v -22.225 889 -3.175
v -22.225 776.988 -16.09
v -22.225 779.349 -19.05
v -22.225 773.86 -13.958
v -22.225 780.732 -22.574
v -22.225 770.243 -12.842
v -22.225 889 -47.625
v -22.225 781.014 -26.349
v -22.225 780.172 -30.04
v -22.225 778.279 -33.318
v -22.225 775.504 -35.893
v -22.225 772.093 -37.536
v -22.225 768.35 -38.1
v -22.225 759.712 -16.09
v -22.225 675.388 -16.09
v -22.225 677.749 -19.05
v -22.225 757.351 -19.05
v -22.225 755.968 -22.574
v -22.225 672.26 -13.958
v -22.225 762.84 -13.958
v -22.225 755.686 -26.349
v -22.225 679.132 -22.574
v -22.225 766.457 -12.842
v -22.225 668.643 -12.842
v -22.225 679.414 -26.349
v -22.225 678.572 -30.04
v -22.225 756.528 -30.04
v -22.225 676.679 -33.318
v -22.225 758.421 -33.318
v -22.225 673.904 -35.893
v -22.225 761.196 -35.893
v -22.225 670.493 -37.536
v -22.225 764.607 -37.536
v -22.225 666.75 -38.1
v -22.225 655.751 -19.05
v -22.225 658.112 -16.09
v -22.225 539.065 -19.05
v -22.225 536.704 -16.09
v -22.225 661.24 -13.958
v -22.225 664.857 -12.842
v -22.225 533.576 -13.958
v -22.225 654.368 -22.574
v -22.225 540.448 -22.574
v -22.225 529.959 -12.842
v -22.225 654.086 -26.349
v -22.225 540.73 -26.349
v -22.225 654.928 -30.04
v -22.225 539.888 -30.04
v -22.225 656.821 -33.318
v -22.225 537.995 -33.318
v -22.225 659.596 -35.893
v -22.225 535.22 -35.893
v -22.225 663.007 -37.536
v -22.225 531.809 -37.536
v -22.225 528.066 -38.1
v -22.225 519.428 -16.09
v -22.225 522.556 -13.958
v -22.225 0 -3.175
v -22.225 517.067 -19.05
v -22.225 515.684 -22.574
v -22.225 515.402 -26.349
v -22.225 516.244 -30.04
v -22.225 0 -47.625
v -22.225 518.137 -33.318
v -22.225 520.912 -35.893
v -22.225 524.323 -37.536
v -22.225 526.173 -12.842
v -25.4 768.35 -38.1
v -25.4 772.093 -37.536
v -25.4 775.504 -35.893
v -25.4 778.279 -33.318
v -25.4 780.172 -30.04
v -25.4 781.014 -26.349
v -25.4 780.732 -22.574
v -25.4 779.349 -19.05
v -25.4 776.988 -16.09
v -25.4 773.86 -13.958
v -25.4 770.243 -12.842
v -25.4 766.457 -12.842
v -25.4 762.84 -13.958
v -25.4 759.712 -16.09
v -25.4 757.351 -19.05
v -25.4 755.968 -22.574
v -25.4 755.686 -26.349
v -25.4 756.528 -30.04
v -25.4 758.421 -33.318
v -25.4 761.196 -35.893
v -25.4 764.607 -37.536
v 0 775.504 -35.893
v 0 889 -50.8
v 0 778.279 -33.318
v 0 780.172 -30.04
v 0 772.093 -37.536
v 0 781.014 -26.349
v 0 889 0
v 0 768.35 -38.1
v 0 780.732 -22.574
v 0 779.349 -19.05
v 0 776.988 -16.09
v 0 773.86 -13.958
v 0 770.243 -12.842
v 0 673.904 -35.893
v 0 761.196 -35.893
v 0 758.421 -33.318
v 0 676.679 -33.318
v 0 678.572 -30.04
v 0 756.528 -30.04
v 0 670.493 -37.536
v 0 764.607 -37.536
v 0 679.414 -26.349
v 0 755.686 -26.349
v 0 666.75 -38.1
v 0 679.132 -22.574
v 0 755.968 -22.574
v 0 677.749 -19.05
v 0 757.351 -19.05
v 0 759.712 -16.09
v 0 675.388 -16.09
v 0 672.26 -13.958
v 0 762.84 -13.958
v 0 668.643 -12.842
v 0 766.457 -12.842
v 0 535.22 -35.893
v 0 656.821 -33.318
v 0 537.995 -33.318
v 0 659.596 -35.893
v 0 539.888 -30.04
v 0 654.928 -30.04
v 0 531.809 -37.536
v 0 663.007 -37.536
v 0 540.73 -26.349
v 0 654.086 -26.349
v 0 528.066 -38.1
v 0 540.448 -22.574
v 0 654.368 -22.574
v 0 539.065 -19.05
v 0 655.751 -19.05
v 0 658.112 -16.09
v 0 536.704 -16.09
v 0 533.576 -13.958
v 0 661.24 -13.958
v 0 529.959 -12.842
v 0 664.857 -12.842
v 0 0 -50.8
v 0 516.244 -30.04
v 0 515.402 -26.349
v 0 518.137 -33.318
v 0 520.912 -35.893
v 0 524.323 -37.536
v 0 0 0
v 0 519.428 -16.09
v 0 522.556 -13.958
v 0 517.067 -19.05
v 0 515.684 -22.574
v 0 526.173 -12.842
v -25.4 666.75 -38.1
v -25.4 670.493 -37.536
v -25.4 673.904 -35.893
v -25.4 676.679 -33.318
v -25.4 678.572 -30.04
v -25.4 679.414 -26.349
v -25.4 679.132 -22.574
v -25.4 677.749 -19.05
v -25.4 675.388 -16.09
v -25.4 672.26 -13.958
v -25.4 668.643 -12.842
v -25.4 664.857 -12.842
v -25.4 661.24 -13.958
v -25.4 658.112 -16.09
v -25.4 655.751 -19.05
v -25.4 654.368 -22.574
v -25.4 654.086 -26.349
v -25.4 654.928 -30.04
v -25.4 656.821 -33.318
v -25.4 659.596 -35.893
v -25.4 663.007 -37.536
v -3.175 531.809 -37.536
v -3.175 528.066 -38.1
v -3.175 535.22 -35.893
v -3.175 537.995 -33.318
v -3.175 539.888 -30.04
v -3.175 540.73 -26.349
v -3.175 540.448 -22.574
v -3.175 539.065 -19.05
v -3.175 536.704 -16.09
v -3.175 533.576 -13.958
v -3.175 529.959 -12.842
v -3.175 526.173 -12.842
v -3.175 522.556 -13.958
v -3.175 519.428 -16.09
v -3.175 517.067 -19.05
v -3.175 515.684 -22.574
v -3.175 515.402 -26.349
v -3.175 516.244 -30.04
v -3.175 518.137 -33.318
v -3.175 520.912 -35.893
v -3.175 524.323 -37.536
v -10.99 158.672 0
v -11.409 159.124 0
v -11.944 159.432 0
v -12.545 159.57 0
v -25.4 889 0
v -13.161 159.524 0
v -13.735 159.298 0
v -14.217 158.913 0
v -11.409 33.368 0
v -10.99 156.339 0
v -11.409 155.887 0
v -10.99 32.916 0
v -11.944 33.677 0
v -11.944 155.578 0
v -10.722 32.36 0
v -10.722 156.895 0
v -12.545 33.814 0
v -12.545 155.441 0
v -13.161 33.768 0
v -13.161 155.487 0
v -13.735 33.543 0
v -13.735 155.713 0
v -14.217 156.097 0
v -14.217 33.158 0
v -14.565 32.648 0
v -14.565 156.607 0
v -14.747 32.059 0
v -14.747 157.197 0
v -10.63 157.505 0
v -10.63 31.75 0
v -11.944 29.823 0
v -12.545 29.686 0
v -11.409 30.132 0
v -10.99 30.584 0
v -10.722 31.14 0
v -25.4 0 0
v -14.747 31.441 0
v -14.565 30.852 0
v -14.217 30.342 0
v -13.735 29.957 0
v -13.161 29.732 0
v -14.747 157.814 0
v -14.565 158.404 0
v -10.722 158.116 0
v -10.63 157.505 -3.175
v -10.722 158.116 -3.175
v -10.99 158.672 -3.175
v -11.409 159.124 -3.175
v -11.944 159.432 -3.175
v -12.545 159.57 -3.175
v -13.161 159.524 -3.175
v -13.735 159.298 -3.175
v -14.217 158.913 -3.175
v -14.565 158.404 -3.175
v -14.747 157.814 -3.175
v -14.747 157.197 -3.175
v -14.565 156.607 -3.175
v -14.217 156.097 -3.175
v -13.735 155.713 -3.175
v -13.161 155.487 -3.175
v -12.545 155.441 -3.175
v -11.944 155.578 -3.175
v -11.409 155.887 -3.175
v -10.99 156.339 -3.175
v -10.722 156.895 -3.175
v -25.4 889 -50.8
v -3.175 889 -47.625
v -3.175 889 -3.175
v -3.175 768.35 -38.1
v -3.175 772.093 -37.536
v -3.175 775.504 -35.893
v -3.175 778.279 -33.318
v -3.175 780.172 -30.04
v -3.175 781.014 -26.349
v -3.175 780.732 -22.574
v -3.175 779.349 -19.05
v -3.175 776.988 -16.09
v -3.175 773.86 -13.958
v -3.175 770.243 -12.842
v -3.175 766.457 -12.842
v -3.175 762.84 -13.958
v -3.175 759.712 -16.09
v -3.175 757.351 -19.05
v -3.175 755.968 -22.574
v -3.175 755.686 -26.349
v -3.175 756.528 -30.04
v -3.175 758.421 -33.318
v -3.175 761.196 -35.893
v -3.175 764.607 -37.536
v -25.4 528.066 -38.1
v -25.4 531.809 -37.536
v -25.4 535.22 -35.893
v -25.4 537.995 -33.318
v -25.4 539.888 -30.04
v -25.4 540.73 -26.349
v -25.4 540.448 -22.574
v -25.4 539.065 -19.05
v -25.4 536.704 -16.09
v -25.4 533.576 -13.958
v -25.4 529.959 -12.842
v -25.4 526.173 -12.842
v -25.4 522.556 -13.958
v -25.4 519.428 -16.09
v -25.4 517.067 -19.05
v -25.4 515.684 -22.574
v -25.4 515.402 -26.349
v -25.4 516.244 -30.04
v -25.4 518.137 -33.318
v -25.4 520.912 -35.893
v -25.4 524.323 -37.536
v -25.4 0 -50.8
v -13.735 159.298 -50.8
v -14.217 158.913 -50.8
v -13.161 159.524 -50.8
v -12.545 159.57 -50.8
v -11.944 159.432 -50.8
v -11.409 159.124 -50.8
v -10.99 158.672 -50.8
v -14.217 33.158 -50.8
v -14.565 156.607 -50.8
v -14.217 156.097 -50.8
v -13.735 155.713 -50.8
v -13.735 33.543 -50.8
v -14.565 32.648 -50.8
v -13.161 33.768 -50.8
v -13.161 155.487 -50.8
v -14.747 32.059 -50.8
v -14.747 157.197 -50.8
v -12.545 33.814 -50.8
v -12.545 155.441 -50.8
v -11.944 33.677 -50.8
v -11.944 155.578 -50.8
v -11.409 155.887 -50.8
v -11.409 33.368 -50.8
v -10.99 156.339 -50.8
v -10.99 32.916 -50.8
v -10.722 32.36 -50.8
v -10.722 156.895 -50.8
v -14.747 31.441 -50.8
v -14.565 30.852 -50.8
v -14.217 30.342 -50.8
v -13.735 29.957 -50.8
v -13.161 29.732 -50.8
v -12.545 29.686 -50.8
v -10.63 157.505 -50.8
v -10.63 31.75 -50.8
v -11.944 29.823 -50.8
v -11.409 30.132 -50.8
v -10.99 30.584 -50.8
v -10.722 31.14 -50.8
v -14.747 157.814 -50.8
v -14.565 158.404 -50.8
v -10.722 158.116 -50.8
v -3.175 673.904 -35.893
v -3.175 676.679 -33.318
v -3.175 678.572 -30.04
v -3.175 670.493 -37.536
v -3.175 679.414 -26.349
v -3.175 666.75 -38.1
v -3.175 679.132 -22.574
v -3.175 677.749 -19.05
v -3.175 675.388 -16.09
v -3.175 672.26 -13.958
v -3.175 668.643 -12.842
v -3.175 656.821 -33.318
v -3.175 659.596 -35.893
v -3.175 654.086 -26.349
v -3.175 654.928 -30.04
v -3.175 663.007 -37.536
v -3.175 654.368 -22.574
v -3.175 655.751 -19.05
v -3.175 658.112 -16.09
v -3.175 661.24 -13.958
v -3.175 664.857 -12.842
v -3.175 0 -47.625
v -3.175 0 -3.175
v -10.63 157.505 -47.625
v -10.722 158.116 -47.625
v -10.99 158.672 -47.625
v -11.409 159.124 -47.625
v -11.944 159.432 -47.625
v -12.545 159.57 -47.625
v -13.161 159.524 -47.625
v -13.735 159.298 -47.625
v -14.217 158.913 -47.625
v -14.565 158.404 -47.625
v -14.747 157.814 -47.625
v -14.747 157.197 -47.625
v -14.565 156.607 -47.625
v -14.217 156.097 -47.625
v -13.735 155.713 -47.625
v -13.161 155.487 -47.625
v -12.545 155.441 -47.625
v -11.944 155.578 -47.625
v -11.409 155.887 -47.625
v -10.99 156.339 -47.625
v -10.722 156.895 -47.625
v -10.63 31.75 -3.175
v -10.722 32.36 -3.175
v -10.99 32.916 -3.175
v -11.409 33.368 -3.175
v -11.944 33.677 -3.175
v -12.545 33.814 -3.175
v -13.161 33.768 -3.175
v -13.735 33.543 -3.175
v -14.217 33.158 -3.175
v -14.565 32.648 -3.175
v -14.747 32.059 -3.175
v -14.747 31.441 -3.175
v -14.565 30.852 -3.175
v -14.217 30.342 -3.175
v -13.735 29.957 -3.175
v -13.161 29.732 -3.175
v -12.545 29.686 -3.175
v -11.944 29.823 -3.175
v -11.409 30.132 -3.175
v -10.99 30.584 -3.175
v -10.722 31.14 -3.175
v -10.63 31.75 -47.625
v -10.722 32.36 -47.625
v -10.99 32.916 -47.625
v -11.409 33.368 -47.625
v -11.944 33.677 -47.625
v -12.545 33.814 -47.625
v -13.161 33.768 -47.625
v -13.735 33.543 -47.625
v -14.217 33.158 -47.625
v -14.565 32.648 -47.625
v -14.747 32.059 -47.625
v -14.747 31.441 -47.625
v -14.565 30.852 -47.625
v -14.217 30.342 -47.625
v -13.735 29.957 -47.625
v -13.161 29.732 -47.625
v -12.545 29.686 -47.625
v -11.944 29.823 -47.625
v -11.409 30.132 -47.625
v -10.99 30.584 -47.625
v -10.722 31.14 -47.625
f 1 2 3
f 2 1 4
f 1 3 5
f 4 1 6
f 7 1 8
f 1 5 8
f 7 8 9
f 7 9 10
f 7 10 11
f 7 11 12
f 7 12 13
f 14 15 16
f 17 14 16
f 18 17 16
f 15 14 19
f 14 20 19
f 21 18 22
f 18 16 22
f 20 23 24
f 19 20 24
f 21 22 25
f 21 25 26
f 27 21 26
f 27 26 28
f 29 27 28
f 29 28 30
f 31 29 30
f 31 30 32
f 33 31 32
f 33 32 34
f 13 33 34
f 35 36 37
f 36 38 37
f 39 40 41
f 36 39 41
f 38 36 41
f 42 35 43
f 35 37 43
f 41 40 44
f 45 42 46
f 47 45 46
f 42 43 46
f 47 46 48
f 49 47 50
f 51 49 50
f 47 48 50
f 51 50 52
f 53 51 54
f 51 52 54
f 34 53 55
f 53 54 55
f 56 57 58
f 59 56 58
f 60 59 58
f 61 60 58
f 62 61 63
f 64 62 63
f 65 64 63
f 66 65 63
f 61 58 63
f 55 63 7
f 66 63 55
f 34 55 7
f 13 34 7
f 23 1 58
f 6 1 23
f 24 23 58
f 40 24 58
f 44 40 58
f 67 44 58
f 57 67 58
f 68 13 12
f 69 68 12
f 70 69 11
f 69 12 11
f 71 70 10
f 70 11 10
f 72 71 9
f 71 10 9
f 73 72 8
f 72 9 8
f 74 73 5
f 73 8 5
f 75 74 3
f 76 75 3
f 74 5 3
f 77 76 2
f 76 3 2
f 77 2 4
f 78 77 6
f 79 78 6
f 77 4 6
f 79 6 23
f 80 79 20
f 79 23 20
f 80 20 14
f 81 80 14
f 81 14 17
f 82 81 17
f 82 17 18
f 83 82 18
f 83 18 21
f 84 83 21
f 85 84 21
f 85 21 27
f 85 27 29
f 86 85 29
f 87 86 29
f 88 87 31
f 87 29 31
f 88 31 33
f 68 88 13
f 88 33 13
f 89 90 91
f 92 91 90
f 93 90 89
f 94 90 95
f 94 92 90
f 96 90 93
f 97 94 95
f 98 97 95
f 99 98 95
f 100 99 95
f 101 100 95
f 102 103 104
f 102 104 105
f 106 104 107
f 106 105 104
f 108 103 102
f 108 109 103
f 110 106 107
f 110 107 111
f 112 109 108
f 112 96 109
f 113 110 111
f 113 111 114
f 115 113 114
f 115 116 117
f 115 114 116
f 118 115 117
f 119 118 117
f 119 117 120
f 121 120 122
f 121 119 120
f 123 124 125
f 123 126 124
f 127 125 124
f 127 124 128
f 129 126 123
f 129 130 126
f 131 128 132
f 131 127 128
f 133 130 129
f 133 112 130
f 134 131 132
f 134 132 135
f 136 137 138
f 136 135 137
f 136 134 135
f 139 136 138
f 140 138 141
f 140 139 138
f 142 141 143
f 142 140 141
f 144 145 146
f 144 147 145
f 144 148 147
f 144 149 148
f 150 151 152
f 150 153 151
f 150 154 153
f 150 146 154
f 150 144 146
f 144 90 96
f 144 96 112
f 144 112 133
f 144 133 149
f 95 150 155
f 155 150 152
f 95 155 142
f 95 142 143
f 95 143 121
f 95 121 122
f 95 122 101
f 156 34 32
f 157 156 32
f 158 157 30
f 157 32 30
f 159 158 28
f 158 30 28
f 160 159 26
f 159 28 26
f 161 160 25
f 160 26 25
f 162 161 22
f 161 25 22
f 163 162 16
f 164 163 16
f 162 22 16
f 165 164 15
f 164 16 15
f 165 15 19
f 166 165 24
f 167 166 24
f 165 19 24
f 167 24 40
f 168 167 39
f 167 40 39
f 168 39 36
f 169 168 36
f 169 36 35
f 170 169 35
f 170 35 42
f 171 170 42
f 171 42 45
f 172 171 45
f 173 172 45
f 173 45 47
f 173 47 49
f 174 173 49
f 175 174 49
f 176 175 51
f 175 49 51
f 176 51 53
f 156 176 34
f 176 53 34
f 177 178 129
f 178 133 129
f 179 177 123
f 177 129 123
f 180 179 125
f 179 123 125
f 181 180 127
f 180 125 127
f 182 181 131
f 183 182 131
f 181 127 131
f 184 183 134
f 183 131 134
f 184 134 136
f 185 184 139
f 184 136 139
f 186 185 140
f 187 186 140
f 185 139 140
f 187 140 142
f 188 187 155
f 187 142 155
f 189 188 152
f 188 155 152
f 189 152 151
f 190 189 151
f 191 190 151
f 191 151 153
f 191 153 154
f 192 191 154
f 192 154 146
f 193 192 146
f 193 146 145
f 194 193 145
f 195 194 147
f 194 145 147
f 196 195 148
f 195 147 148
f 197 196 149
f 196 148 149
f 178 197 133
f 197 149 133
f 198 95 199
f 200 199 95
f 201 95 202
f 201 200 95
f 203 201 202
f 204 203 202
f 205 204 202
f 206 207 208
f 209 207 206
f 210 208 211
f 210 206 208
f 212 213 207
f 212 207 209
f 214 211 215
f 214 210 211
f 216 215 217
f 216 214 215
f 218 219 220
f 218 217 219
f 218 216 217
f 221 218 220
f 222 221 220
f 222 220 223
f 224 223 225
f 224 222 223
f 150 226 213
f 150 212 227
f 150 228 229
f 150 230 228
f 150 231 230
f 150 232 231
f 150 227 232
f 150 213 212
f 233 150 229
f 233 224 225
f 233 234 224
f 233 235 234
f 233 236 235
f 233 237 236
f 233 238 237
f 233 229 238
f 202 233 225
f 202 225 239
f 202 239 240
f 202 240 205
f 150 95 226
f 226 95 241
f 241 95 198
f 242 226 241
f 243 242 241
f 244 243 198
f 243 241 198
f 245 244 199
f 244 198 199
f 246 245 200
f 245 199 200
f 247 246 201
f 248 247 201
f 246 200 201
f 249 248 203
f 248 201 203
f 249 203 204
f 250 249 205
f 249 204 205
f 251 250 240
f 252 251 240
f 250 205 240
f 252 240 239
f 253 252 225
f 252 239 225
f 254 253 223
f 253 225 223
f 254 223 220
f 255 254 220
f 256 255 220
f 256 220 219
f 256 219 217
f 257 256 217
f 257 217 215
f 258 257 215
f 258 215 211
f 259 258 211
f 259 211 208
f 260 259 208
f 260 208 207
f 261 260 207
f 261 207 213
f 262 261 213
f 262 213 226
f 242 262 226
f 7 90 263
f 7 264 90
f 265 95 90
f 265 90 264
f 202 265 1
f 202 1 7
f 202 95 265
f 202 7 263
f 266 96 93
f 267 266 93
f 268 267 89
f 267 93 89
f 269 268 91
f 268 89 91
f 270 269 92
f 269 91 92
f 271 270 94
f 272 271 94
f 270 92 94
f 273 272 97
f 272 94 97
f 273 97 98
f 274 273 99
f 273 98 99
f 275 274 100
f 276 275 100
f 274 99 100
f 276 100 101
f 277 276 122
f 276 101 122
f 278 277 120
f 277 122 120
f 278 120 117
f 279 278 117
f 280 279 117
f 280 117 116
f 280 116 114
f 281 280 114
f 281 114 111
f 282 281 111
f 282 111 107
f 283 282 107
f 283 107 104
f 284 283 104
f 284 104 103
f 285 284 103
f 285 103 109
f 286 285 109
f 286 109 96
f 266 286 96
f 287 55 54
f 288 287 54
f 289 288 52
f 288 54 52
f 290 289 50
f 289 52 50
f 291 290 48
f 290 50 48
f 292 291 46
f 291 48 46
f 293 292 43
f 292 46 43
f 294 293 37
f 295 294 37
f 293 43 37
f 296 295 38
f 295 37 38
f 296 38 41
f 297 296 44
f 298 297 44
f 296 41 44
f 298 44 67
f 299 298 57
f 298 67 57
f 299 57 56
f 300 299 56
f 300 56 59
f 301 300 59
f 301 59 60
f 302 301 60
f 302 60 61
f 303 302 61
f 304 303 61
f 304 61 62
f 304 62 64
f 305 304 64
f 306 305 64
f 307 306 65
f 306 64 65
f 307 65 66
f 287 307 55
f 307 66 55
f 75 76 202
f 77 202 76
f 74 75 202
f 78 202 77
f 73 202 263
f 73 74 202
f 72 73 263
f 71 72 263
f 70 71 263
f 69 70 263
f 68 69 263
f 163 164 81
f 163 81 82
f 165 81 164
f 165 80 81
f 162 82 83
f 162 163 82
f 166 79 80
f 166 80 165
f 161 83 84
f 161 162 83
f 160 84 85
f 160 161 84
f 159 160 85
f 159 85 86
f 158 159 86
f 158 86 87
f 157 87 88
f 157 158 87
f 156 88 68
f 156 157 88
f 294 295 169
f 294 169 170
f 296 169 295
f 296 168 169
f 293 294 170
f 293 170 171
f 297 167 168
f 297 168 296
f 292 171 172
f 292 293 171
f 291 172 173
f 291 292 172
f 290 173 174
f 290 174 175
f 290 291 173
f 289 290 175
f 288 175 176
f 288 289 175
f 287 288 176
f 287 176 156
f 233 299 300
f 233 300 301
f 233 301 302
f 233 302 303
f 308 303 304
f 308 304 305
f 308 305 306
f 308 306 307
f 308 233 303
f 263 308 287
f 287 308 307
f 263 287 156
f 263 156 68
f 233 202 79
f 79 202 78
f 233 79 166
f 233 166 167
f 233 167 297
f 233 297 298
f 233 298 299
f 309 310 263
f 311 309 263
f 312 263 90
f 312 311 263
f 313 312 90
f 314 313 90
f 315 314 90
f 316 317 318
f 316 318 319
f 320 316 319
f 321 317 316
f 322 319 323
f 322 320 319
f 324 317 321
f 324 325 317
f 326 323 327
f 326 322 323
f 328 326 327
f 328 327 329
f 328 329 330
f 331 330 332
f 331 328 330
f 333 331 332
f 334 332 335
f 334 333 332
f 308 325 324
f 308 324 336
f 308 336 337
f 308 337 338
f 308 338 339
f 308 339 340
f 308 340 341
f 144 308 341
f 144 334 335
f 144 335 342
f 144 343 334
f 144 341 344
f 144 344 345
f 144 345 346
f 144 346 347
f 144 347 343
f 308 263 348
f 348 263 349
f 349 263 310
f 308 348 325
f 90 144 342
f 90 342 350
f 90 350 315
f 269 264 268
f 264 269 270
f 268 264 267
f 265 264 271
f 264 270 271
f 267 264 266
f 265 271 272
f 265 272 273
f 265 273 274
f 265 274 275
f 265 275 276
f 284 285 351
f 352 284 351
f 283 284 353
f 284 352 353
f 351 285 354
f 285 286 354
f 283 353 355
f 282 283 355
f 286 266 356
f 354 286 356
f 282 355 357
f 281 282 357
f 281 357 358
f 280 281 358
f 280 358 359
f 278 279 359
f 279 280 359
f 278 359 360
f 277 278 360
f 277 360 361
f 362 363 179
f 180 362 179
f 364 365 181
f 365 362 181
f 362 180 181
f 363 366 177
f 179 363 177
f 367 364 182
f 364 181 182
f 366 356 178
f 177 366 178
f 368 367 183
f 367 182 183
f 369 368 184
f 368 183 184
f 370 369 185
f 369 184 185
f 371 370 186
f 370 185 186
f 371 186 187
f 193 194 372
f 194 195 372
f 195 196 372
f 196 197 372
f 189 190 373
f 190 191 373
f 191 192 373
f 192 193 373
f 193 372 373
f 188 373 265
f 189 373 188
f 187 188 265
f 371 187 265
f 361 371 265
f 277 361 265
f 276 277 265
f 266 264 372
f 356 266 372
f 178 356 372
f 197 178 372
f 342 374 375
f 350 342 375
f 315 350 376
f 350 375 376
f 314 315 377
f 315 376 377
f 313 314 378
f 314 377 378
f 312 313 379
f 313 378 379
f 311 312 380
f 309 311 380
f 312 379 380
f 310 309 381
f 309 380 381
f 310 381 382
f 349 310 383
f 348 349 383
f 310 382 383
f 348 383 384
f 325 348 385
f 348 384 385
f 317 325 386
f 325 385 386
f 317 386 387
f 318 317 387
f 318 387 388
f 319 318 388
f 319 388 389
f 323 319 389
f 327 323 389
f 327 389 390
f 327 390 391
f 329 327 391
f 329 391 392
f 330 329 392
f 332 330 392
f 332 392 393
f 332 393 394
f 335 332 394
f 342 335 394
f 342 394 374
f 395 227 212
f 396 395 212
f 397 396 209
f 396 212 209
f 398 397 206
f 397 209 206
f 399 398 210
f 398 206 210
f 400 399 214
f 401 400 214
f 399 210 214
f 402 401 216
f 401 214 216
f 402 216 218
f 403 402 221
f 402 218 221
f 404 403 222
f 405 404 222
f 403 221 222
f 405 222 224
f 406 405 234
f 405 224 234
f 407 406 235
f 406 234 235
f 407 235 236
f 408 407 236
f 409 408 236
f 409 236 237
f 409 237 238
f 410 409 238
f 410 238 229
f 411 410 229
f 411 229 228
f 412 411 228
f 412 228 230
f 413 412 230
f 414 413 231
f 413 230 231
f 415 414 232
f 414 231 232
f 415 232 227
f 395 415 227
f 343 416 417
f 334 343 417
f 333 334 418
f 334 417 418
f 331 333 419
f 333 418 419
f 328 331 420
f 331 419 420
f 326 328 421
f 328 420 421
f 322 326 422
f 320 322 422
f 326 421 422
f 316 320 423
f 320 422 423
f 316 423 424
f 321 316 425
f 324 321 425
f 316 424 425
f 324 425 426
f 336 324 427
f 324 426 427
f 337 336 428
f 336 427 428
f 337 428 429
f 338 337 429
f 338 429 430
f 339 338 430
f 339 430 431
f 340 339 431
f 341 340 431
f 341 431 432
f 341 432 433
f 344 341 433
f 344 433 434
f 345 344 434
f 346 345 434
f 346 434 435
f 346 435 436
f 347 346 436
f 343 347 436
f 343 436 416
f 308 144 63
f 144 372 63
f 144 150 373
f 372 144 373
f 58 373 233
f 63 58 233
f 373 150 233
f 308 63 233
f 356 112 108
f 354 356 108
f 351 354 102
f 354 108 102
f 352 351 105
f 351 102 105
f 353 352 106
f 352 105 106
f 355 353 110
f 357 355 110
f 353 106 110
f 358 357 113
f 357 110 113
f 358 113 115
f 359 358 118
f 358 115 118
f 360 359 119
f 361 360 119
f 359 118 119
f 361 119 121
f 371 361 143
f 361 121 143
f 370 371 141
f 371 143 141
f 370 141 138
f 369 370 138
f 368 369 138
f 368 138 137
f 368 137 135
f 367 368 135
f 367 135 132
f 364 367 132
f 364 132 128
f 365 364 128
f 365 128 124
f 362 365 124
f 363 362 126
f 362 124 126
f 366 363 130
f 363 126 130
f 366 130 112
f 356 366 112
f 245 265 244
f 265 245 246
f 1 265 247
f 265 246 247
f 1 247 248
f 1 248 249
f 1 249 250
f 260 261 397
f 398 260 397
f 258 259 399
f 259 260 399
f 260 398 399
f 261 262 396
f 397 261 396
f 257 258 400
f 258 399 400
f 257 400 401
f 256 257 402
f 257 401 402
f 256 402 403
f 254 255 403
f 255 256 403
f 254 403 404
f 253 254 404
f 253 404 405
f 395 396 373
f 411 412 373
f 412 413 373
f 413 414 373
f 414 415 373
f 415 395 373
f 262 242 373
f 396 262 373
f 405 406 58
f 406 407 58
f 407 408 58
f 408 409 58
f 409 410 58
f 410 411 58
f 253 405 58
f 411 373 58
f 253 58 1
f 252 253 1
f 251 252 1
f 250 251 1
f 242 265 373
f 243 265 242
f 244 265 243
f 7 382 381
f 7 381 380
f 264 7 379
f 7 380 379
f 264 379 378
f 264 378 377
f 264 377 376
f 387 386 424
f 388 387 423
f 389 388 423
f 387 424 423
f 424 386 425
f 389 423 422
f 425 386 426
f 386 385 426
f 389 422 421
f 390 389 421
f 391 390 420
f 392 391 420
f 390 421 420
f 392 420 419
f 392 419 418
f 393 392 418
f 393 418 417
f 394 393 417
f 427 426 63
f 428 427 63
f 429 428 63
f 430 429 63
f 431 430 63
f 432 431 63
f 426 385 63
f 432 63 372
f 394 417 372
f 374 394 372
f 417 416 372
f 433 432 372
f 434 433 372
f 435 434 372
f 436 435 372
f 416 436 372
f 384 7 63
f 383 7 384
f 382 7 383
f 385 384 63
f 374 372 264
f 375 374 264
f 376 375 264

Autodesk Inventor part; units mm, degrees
ref_plane "YZ Plane" through (0, 0, 0) normal (1, 0, 0) x (0, 1, 0)
ref_plane "XZ Plane" through (0, 0, 0) normal (0, 1, 0) x (-1, 0, 0)
ref_plane "XY Plane" through (0, 0, 0) normal (0, 0, 1) x (1, 0, 0)
sketch "Sketch1" plane through (0, 0, 0) normal (0, 1, 0) x (-1, 0, 0)
  line L0 (0, 0) -> (25.4, 0)
  line L1 (25.4, 0) -> (25.4, -50.8)
  line L2 (25.4, -50.8) -> (0, -50.8)
  line L3 (0, -50.8) -> (0, 0)
  line L4 (3.175, -3.175) -> (22.225, -3.175)
  line L5 (22.225, -3.175) -> (22.225, -47.625)
  line L6 (22.225, -47.625) -> (3.175, -47.625)
  line L7 (3.175, -47.625) -> (3.175, -3.175)
  dimension "d0" = 50.8
  dimension "d1" = 25.4
  dimension "d2" = 3.175
extrude "Extrusion1" add sketch "Sketch1" along normal blind 889
sketch "Sketch6" plane through (0, 0, 0) normal (1, 0, 0) x (0, 0, -1)
  circle A0 centre (25.4, 768.35) radius 12.7
  line L0 (0, 889) -> (50.8, 889) projected
  line L1 (0, 0) -> (0, 889) projected
  dimension "d5" = 25.4
  dimension "d6" = 120.65
  dimension "d7" = 25.4
extrude "Extrusion2" cut sketch "Sketch6" against normal blind 25.4
sketch "Sketch8" plane through (-25.4, 0, 0) normal (0, 0, 1) x (1, 0, 0)
  circle A0 centre (12.7, 31.75) radius 2.0701
  line L0 (0, 0) -> (0, 889) projected
  line L1 (25.4, 0) -> (0, 0) projected
  dimension "d13" = 4.1402
  dimension "d14" = 12.7
  dimension "d15" = 31.75
extrude "Extrusion3" cut sketch "Sketch8" against normal blind 76.2
sketch "Sketch9" plane through (-25.4, 0, 0) normal (0, 0, 1) x (1, 0, 0)
  circle A0 centre (12.7, 157.5054) radius 2.0701
  line L0 (25.4, 0) -> (0, 0) projected
  line L1 (0, 0) -> (0, 889) projected
  dimension "d18" = 4.1402
  dimension "d19" = 157.5054
  dimension "d20" = 12.7
extrude "Extrusion4" cut sketch "Sketch9" against normal blind 76.2
sketch "Sketch10" plane through (0, 0, 0) normal (1, 0, 0) x (0, 0, -1)
  circle A0 centre (25.4, 528.066) radius 12.7
  line L0 (50.8, 0) -> (50.8, 889) projected
  line L1 (50.8, 0) -> (0, 0) projected
  circle A1 centre (25.4, 666.75) radius 12.7
  dimension "d23" = 25.4
  dimension "d24" = 25.4
  dimension "d25" = 528.066
  dimension "d26" = 25.4
  dimension "d27" = 666.75
extrude "Extrusion5" cut sketch "Sketch10" against normal blind 25.4
properties part number "16in 2x1 Aluminum Block-ver1-1111-2019"
